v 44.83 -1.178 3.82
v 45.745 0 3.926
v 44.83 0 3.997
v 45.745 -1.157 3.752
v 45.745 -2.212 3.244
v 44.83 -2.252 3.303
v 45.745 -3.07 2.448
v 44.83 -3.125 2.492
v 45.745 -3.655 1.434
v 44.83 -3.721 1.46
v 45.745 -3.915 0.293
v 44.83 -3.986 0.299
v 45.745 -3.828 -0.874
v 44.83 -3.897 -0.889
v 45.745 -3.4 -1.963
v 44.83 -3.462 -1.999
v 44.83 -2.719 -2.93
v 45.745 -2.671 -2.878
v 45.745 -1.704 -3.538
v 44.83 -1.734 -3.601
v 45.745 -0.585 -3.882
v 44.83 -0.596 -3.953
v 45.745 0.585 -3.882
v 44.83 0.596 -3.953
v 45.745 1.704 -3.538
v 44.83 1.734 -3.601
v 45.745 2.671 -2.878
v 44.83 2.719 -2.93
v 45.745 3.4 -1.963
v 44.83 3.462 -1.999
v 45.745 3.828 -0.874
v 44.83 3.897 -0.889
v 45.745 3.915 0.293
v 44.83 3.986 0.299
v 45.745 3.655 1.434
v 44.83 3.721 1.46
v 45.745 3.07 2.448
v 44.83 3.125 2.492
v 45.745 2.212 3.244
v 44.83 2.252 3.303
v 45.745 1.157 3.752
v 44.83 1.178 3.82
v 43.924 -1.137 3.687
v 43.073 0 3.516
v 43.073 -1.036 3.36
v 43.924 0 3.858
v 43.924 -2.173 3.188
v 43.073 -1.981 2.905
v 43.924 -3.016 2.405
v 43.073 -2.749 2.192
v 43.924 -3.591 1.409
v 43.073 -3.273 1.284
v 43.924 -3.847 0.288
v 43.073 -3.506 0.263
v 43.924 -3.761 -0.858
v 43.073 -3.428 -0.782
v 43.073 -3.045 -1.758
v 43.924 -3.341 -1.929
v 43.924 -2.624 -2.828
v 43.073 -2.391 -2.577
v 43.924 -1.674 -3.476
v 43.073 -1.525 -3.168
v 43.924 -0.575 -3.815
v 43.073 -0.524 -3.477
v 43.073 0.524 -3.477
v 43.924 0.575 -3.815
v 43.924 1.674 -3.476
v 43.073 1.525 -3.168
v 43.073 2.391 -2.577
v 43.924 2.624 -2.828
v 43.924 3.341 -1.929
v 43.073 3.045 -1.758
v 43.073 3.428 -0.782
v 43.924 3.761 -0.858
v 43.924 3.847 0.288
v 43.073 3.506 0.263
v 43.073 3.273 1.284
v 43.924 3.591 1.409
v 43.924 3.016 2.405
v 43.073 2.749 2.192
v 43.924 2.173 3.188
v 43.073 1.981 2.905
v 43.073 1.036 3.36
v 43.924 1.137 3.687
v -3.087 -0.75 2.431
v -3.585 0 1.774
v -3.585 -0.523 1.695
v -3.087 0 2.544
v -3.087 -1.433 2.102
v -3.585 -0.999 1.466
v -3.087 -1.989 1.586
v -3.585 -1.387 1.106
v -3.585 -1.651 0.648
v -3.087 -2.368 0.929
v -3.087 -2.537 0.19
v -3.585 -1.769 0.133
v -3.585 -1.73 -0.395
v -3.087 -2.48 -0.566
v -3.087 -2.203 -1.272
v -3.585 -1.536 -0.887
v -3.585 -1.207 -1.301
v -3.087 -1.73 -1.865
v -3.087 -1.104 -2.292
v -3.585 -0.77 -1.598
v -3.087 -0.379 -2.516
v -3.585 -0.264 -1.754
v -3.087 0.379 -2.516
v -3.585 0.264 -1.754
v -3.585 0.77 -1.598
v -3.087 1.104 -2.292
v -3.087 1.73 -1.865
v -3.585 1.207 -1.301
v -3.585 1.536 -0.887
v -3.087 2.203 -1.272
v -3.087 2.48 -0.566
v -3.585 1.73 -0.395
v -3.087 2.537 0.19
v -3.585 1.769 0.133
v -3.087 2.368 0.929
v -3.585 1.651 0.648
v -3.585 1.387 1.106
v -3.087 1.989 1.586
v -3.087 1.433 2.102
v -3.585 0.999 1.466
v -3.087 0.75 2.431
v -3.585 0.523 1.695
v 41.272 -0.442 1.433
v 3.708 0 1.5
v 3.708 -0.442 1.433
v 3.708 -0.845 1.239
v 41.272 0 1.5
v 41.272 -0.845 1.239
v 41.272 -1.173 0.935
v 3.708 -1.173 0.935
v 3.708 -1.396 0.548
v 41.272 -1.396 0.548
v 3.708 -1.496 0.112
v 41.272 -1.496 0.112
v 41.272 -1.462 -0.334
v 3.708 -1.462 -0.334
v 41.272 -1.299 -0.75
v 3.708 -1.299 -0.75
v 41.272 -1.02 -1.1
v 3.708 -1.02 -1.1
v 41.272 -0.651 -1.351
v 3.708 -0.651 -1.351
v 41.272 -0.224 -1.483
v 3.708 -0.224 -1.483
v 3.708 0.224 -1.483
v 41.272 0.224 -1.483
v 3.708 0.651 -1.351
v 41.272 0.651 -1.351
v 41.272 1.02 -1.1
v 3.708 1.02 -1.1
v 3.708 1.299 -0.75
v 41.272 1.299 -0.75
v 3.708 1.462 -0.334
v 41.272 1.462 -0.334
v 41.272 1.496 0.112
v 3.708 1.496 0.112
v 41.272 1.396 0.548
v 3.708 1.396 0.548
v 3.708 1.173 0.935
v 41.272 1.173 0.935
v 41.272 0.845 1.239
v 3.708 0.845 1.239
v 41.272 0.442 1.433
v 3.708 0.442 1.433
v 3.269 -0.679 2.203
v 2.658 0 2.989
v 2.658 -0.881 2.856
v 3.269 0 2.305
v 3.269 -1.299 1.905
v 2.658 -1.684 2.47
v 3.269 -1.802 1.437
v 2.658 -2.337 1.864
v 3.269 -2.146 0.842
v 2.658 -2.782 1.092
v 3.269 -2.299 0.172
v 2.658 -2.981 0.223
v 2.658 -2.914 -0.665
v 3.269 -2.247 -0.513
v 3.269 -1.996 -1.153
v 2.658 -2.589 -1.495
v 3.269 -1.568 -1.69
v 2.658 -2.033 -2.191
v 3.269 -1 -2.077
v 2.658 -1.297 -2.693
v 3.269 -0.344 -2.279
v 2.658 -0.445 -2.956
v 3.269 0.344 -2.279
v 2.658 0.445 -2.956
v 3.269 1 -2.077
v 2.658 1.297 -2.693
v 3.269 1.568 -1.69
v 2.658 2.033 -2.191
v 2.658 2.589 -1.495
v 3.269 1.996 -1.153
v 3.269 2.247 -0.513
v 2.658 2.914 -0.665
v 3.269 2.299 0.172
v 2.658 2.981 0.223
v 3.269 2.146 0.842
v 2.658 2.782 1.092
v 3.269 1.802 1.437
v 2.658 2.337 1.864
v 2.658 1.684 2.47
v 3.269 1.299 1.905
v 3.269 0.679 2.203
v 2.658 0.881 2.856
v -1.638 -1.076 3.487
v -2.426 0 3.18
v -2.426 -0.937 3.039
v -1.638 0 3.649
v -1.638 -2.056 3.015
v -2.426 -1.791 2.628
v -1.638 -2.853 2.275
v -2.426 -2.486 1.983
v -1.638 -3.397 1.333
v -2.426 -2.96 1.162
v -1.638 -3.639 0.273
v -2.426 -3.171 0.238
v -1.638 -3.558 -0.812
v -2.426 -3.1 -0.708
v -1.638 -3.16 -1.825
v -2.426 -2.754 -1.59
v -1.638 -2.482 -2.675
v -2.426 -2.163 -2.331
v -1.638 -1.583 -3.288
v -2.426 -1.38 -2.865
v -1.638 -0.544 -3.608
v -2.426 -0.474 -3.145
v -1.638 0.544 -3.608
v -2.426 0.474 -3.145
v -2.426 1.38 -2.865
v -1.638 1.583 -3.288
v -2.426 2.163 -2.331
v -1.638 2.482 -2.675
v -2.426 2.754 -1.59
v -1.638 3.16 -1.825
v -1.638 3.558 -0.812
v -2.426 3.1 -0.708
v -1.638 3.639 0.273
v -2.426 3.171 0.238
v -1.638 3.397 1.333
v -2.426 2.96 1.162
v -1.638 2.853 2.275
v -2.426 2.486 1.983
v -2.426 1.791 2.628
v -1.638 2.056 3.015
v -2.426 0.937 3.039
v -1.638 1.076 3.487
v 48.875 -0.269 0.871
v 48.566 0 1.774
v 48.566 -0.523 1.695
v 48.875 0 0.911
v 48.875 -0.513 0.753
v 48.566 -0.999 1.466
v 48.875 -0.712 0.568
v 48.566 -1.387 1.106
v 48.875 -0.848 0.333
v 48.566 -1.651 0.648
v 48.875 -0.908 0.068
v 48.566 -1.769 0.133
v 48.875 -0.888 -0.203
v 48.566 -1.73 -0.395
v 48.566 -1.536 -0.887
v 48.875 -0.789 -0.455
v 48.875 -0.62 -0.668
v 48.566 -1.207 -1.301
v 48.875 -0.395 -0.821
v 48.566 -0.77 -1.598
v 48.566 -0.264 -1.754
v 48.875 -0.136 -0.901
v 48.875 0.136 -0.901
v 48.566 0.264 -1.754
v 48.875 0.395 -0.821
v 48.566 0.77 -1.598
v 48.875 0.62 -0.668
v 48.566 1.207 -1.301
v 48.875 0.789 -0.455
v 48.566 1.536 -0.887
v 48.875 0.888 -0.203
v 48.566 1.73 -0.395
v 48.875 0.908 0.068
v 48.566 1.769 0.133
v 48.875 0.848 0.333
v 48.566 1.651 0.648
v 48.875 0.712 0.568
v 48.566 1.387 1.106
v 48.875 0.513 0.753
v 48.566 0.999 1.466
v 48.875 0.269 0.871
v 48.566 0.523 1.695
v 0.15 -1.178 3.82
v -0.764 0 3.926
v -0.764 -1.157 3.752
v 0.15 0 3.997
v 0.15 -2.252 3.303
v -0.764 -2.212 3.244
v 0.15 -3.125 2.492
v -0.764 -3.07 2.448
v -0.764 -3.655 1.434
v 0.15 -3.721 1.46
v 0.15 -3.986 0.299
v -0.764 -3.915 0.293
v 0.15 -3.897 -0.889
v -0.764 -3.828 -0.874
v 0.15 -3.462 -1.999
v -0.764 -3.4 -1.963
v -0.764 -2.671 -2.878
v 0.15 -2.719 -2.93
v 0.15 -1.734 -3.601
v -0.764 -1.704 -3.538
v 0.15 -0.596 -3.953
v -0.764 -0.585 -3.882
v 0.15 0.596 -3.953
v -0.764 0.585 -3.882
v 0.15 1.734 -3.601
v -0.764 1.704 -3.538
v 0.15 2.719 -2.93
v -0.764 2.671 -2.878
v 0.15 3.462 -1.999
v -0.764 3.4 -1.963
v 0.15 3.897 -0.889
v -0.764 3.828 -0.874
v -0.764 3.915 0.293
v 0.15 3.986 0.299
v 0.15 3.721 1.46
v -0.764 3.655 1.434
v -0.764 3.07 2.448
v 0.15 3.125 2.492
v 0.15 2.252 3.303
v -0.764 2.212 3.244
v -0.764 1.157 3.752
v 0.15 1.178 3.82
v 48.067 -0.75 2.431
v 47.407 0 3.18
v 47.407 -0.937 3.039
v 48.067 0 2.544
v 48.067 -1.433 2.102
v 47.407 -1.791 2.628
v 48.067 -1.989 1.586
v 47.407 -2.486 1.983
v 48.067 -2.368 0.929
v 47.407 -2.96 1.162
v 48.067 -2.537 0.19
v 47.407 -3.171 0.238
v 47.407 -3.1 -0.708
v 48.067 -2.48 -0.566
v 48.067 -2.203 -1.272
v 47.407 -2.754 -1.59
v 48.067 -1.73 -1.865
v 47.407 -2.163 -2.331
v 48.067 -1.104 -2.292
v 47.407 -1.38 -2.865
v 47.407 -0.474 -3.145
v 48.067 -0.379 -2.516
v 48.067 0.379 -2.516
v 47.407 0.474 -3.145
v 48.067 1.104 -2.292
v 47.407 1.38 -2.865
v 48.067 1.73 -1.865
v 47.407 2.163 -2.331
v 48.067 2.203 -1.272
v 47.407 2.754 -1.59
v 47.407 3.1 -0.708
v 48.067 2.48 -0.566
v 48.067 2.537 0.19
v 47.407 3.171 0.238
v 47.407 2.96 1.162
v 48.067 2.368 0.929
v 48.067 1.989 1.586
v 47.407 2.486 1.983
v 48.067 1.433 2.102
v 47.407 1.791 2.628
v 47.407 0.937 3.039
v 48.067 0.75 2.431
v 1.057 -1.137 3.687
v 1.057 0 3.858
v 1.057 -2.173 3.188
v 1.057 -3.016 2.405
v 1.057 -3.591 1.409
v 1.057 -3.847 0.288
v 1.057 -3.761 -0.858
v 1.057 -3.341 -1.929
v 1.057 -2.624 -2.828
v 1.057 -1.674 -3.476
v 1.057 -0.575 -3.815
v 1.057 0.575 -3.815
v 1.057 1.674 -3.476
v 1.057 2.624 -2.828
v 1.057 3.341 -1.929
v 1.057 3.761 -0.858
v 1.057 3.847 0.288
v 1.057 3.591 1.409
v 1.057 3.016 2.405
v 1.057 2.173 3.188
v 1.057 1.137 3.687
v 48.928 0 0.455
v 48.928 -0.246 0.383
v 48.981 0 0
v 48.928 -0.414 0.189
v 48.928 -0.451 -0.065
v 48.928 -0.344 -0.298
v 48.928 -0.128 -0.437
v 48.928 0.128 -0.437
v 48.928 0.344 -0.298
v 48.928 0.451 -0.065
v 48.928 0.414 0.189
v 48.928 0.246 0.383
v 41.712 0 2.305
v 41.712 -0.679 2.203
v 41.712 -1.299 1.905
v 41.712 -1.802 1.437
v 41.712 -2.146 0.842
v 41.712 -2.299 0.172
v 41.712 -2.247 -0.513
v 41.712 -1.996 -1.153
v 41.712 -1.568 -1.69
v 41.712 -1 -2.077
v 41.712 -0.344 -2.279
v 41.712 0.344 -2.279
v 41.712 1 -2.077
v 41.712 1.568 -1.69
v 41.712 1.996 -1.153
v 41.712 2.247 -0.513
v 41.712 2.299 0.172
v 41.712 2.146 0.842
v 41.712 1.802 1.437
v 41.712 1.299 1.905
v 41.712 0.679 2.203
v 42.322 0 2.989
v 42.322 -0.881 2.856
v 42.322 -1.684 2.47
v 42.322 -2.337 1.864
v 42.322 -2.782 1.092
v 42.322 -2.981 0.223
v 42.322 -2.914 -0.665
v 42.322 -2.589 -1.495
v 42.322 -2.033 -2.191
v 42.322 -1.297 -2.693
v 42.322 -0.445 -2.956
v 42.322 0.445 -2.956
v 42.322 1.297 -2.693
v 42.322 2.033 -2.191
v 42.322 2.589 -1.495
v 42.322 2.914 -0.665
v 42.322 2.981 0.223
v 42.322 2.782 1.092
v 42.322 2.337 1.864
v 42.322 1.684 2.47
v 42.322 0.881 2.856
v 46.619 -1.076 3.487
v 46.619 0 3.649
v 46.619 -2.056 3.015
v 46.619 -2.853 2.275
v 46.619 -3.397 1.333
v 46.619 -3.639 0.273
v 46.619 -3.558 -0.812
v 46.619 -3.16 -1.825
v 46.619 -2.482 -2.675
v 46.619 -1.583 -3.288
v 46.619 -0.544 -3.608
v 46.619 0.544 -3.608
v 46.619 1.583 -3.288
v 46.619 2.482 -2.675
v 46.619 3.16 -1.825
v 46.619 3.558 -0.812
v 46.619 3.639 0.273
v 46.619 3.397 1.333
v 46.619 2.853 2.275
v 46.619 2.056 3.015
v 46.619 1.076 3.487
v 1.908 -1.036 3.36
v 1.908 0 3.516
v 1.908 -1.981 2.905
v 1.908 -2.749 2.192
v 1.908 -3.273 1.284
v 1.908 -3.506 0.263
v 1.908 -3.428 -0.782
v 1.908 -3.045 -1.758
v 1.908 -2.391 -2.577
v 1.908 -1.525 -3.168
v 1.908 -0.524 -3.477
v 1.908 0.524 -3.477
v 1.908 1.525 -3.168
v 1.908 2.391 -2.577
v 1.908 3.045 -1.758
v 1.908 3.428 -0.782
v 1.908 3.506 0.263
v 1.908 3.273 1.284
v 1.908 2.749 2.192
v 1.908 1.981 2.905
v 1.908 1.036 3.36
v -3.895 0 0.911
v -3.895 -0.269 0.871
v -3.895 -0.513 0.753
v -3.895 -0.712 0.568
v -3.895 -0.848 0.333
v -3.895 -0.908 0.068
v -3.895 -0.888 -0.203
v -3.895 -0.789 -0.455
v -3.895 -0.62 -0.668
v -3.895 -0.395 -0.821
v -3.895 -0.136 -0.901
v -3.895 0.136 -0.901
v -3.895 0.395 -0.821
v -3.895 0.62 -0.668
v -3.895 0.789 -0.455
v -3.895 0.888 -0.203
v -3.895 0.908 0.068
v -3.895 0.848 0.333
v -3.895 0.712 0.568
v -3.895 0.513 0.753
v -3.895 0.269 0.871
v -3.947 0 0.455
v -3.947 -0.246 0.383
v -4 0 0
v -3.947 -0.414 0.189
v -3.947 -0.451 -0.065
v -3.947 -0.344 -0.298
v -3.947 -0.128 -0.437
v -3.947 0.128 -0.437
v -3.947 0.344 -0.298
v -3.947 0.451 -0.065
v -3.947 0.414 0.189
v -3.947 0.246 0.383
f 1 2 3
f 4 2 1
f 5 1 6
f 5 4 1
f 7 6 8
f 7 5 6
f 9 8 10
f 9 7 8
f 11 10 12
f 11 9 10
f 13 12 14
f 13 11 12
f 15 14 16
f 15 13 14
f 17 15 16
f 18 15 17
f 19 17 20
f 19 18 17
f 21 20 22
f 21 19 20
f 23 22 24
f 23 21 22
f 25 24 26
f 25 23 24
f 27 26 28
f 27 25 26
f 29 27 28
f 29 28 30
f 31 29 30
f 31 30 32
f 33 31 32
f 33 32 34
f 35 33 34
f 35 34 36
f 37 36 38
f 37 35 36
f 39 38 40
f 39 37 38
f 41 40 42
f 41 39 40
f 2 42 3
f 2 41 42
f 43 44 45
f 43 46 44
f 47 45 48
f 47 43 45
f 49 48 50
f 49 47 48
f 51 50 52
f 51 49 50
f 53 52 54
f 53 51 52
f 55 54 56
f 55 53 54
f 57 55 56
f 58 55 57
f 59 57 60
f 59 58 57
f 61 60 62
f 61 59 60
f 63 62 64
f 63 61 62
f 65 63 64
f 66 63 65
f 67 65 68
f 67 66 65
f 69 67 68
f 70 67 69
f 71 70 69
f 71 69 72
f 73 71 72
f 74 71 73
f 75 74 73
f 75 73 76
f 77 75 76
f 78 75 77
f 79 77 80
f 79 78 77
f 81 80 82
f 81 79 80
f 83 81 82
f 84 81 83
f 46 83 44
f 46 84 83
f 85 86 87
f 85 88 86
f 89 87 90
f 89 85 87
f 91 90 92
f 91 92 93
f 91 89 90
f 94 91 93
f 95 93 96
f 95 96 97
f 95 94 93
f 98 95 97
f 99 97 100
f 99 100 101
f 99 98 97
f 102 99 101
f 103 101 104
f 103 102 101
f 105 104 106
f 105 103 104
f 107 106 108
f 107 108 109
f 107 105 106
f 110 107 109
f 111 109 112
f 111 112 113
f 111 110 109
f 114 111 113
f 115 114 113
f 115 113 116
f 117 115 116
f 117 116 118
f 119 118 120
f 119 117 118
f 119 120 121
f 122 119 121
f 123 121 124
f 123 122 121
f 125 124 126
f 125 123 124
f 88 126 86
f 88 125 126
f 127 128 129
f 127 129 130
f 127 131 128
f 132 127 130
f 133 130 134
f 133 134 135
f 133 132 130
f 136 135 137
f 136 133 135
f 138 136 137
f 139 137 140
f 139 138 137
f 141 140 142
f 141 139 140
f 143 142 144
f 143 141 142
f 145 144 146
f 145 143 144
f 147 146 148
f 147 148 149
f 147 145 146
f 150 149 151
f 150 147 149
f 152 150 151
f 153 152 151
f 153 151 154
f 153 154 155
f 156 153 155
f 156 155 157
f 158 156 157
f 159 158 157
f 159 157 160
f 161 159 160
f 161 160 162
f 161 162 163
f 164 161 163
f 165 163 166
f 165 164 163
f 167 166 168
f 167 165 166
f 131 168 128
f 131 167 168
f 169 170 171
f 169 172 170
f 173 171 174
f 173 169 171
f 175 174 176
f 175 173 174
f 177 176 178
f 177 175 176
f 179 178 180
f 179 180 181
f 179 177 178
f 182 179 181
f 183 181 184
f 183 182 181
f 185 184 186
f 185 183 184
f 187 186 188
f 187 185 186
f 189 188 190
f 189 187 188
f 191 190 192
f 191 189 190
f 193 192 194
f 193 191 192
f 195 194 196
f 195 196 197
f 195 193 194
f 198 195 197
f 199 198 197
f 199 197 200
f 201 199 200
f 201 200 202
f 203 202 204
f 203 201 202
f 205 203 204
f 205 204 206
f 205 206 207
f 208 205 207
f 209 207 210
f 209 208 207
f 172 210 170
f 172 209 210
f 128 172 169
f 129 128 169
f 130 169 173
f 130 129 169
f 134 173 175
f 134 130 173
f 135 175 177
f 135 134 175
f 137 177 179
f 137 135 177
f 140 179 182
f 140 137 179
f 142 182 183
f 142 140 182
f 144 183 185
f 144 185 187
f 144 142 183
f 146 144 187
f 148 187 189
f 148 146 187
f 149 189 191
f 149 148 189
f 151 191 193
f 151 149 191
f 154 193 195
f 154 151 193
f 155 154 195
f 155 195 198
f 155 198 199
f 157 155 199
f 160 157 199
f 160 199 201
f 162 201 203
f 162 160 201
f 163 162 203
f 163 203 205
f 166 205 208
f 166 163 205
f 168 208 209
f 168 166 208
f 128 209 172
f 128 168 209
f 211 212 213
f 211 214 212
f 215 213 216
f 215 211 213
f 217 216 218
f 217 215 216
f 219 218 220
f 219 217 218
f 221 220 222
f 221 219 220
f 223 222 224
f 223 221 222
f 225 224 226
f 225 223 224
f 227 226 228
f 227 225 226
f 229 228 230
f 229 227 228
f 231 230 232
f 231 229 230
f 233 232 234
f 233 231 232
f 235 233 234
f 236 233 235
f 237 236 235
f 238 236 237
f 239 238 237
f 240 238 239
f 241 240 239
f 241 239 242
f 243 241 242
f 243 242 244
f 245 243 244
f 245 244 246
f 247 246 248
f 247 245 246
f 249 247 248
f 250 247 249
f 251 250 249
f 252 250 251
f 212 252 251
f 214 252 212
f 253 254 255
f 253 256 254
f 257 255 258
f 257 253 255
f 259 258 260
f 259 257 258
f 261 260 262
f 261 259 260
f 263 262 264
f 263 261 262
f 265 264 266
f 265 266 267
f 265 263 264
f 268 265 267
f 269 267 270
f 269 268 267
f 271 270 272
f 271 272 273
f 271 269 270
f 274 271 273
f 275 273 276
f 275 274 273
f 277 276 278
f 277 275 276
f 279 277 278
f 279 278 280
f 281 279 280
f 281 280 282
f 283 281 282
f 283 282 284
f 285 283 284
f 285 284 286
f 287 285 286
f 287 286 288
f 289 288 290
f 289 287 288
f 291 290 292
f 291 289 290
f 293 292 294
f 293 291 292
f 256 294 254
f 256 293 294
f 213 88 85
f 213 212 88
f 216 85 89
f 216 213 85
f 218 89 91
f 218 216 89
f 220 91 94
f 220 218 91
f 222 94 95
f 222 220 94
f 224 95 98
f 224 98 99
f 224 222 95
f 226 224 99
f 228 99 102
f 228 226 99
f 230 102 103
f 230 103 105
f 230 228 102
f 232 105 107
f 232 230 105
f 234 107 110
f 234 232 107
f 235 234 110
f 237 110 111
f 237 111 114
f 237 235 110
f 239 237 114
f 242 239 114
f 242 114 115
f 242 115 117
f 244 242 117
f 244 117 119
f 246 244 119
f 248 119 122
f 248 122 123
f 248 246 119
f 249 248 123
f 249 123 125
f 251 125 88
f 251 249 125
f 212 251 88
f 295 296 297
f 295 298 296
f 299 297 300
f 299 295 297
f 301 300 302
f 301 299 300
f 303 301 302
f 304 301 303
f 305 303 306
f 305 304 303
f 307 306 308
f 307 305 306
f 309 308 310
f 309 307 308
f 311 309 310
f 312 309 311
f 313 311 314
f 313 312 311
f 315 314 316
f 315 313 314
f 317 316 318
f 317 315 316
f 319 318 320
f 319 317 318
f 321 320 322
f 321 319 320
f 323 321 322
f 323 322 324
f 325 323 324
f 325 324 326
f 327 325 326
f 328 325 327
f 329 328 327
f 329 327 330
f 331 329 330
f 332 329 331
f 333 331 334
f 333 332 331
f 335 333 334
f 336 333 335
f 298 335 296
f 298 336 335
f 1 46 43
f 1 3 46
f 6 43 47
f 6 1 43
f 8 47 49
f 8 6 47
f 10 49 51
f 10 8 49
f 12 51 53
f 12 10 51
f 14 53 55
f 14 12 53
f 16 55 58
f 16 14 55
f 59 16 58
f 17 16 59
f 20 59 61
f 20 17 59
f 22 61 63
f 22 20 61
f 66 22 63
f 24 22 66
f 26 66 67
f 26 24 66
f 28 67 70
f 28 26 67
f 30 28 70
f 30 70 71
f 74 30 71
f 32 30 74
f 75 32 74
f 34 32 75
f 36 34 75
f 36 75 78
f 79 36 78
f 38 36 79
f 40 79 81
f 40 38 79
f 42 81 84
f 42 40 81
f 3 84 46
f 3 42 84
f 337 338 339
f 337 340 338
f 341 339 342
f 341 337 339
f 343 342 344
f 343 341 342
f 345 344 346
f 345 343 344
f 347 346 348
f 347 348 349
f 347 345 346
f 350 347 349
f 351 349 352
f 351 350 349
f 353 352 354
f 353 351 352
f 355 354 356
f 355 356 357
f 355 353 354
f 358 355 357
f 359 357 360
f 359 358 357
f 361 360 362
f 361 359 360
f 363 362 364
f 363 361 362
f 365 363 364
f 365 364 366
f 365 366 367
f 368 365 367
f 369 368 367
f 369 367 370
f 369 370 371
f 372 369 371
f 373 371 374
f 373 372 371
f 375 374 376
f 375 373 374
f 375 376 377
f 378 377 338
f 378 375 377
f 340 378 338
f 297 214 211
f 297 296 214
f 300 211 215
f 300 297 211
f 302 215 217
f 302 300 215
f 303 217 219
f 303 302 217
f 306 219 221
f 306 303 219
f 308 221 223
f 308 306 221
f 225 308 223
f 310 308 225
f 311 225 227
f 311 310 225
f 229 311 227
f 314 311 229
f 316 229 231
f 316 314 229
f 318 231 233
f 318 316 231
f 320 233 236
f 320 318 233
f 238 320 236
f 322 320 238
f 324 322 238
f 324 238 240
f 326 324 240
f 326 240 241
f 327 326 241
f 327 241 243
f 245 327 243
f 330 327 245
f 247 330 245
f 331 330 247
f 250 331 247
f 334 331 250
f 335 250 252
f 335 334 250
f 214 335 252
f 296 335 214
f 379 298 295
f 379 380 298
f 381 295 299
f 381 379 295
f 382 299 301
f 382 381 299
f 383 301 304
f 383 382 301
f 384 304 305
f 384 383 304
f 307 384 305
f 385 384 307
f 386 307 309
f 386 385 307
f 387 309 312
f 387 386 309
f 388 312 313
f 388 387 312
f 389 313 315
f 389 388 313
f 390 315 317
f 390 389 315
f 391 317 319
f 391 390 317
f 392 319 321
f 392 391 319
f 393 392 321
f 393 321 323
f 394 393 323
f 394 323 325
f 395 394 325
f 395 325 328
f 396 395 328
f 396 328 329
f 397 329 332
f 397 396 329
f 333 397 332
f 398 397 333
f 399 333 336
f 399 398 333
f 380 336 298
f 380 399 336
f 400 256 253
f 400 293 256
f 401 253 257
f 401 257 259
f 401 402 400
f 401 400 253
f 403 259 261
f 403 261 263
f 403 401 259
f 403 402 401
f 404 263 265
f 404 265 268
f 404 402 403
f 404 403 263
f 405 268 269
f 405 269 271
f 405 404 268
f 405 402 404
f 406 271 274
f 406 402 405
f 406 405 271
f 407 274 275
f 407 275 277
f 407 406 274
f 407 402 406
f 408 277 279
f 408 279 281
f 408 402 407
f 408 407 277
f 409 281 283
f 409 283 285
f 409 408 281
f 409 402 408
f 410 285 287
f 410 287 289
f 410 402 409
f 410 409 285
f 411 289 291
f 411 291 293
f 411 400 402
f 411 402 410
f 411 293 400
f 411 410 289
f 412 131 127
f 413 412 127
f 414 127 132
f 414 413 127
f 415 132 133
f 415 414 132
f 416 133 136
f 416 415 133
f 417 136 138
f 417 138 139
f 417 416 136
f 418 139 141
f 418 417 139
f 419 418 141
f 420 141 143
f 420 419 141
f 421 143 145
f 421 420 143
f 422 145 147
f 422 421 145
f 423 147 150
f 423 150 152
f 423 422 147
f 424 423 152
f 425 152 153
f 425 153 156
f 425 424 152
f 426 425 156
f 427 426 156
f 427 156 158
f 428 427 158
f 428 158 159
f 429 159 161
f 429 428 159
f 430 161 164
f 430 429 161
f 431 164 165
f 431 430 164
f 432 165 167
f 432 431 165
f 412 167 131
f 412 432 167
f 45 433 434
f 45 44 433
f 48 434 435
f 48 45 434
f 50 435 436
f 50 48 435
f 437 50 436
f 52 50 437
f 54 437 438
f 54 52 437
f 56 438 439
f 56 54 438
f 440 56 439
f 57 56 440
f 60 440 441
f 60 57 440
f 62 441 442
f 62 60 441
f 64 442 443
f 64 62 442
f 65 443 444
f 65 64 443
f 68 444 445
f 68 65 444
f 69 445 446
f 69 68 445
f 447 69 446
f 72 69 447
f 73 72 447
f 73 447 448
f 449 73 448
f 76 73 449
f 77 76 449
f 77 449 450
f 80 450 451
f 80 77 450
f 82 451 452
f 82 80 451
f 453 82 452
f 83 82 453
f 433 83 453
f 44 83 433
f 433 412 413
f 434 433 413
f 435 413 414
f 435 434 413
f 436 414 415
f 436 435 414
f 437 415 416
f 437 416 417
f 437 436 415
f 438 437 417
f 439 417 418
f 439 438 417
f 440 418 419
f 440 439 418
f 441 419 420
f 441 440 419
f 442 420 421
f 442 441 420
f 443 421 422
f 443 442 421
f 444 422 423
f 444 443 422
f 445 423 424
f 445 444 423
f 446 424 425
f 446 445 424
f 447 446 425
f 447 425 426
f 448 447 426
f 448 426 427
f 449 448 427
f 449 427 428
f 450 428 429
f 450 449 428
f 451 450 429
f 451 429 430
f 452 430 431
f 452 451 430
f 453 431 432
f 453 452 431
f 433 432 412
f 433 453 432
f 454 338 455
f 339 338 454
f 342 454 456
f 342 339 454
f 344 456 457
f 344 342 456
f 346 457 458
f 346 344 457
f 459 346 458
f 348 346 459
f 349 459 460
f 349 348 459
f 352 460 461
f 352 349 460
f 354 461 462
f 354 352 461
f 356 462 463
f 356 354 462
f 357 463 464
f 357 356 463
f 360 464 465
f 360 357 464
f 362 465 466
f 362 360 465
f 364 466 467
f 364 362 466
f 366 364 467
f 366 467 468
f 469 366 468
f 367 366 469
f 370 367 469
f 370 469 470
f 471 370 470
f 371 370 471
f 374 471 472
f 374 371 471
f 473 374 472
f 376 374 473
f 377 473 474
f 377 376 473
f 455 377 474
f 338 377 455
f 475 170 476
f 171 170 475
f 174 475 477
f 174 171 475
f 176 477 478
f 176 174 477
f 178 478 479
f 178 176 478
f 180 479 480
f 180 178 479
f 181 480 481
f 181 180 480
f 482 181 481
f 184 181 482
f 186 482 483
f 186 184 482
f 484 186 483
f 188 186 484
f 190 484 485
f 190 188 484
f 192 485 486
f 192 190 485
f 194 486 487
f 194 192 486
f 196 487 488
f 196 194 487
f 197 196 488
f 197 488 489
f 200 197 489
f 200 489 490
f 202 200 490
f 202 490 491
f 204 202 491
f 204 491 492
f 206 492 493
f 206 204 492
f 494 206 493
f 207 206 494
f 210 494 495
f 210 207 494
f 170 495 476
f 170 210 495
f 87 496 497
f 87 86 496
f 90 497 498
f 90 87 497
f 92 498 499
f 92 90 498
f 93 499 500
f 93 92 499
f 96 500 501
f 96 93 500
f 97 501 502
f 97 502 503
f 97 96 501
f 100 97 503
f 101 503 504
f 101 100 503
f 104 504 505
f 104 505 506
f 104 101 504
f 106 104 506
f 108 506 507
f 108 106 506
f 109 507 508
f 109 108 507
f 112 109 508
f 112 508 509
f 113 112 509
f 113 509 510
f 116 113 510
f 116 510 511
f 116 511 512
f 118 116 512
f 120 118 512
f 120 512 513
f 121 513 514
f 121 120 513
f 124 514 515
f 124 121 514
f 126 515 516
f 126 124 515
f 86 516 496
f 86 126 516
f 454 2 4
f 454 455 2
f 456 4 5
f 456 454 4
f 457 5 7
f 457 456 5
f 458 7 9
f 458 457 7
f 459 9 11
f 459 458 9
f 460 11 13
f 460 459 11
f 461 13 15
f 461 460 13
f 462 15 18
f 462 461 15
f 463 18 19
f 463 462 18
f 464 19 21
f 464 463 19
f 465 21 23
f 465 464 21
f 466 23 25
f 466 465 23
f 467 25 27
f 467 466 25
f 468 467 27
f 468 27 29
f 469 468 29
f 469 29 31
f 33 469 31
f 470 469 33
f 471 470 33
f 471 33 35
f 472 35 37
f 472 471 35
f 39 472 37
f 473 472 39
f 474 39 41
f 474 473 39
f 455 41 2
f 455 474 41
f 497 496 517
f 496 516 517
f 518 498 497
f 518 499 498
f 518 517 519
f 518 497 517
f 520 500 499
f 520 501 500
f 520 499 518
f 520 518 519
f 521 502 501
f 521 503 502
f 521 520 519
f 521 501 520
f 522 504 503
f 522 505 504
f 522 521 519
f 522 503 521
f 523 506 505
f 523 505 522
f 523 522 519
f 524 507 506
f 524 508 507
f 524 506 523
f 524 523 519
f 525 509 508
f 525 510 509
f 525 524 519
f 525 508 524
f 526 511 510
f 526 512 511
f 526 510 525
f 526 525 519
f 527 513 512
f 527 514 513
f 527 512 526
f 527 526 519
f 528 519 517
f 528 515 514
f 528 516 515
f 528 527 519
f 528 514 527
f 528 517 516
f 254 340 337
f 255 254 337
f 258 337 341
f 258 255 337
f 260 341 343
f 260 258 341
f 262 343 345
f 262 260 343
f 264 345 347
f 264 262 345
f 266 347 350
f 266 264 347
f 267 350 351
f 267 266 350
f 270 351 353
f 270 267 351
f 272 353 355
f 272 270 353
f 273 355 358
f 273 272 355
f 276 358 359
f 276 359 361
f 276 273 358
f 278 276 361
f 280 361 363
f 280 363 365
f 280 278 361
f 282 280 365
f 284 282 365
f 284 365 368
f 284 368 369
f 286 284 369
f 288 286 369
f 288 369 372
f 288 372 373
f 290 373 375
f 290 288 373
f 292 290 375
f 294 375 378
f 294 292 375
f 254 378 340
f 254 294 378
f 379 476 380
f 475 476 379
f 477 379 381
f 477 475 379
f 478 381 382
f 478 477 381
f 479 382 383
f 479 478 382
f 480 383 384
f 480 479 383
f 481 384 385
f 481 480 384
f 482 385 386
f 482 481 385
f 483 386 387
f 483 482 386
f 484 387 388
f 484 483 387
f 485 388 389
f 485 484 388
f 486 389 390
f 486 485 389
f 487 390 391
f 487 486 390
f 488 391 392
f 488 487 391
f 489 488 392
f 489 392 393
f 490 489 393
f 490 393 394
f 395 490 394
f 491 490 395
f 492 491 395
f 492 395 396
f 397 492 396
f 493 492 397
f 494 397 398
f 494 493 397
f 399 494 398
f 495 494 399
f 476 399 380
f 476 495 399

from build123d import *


with BuildPart() as part:
    # Pushrod Sketch → Pushrod (revolve)
    with BuildSketch(Plane.XY):
        Polygon((-4, 0), (-3.894878566, 0.910999976), (-3.585039521, 1.774117141), (-3.086768229, 2.543985436), (-2.426254185, 3.180140033), (-1.638214481, 3.649144189), (-0.76406905, 3.92634671), (0.150236399, 3.997177632), (1.056645315, 3.857914032), (1.907516195, 3.515875704), (2.658126657, 2.989040428), (3.269024075, 2.305099043), (3.708099244, 1.5), (41.272452109, 1.5), (41.711527278, 2.305099043), (42.322424696, 2.989040428), (43.073035158, 3.515875704), (43.923906038, 3.857914032), (44.830314954, 3.997177632), (45.744620403, 3.92634671), (46.618765834, 3.649144189), (47.406805538, 3.180140033), (48.067319582, 2.543985436), (48.565590874, 1.774117141), (48.875429919, 0.910999976), (48.980551353, 0), align=None)
    revolve(axis=Axis((-1000, 0, 0), (1, 0, 0)))


solid = part.part
